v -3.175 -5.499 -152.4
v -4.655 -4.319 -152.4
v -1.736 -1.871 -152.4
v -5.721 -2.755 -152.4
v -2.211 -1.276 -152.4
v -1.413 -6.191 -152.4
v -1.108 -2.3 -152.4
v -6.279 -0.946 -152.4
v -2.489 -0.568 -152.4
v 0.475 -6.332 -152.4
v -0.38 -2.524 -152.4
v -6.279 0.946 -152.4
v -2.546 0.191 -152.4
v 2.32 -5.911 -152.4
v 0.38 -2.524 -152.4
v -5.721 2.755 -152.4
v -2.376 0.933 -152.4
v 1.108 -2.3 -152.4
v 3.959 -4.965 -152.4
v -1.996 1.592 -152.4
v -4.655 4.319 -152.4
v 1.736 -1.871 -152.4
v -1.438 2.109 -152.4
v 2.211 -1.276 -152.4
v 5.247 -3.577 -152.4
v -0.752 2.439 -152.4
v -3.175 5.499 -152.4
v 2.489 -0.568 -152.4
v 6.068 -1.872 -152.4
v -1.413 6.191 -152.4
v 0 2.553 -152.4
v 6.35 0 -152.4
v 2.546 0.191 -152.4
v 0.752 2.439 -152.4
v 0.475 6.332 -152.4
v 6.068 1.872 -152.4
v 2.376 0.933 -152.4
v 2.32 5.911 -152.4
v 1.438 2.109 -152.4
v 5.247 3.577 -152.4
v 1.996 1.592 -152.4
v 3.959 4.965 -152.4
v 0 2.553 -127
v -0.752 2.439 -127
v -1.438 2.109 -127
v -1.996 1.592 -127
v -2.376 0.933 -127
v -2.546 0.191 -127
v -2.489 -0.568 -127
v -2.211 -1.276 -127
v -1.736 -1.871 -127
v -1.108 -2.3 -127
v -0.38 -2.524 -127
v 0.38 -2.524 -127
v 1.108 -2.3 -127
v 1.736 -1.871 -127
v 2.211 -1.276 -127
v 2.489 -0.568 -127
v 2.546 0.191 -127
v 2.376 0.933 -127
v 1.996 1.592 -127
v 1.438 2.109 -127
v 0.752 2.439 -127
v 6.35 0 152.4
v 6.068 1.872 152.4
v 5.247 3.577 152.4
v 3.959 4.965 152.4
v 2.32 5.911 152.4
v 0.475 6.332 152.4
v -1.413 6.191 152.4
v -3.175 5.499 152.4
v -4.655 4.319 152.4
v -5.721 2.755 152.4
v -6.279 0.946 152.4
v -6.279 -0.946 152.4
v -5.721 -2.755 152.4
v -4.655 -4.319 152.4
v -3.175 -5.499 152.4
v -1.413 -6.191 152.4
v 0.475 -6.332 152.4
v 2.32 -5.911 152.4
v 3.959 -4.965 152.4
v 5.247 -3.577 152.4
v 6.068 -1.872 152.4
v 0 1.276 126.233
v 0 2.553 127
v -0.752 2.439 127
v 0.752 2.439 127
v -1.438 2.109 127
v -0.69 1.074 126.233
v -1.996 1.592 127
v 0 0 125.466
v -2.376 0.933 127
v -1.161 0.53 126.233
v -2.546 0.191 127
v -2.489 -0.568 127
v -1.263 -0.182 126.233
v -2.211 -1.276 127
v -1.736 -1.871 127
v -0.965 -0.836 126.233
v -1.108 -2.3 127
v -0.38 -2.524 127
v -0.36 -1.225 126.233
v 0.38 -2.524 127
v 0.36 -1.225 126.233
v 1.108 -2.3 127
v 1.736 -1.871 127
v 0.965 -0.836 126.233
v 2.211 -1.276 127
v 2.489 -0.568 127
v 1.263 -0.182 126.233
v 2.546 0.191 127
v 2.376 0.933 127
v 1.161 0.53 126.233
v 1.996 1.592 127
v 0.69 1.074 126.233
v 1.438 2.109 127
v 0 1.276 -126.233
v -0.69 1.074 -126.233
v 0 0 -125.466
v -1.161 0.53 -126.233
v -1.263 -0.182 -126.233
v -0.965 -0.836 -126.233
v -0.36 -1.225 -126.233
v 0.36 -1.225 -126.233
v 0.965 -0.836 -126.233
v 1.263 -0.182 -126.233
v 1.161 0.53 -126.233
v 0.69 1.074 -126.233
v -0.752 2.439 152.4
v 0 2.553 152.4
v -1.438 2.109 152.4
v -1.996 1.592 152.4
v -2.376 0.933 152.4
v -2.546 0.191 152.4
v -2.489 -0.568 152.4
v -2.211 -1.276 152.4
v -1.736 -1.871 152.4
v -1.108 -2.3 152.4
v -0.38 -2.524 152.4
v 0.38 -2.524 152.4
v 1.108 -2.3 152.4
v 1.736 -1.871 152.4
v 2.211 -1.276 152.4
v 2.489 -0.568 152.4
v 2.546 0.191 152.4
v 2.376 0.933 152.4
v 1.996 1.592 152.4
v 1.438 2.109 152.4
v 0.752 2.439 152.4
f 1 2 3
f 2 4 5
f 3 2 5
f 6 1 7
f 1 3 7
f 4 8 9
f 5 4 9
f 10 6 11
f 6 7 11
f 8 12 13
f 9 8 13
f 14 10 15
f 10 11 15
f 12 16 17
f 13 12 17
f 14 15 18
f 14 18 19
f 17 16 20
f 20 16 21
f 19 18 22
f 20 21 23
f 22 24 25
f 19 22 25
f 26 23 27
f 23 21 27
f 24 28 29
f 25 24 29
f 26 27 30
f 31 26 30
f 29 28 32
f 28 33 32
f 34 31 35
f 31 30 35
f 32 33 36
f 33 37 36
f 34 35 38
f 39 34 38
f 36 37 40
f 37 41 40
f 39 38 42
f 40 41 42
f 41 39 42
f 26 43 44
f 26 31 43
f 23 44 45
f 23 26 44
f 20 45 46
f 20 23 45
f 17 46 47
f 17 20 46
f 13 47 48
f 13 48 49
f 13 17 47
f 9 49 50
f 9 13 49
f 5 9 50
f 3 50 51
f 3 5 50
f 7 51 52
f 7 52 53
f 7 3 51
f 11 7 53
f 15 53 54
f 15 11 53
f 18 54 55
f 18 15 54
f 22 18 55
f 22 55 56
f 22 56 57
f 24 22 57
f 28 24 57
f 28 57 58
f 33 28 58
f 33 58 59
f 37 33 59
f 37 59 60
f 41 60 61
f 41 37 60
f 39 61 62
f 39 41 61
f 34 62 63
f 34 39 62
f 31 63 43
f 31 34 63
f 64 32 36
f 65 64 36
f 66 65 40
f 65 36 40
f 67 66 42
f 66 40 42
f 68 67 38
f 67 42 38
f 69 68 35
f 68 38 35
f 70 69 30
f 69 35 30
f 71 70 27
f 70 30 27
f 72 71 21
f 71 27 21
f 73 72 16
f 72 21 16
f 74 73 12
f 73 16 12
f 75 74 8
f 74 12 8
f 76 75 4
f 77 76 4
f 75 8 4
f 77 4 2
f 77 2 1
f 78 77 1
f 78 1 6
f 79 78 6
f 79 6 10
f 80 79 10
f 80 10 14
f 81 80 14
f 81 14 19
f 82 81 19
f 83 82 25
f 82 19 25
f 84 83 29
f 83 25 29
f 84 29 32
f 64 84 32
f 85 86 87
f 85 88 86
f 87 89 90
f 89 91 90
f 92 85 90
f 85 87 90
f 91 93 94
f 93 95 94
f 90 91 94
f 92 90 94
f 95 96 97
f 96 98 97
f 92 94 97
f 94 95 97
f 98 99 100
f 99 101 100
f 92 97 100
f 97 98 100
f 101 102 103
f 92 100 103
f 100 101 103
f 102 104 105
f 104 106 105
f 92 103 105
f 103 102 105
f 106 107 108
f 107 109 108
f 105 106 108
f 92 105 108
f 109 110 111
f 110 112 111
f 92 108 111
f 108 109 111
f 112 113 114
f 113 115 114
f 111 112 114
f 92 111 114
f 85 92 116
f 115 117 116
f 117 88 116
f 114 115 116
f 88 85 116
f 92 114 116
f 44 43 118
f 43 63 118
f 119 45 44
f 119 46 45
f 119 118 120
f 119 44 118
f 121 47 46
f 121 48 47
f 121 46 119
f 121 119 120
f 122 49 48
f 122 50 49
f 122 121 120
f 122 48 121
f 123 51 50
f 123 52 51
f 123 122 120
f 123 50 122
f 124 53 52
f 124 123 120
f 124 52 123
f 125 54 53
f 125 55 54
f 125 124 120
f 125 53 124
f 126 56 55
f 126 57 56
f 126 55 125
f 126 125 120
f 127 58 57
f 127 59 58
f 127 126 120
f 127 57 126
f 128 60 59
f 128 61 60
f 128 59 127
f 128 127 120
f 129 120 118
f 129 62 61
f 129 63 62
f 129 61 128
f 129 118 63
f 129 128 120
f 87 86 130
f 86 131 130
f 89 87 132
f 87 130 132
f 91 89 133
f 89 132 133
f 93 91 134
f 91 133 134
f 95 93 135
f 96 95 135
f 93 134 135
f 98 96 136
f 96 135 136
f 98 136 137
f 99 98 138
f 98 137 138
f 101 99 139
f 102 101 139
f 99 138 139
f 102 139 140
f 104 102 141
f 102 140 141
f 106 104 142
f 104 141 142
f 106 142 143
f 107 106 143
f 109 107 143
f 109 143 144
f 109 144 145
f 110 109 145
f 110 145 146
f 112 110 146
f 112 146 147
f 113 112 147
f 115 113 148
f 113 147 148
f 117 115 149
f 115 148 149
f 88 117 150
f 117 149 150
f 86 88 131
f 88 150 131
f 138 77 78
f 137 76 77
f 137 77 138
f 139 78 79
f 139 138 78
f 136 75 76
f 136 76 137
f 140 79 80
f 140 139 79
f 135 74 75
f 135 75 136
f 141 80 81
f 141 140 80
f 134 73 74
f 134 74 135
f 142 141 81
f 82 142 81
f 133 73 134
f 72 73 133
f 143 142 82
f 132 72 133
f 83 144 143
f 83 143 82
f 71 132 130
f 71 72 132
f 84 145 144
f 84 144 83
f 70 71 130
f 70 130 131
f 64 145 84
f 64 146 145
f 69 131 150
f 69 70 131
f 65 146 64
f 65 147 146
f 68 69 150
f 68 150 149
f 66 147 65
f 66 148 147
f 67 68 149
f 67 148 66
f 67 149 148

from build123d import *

# Parameters (mm, degrees)
BOSS_EXTRUDE1_DEPTH      = 152.4
BOSS_EXTRUDE1_DEPTH_BACK = 152.4
SKETCH3_R                = 6.35


with BuildPart() as part:
    # Sketch3 → Boss-Extrude1 (new, two sides: drawn at the far end of the back side and taken through both)
    with BuildSketch(Plane.XY.offset(-BOSS_EXTRUDE1_DEPTH_BACK)):
        Circle(SKETCH3_R)
    extrude(amount=BOSS_EXTRUDE1_DEPTH + BOSS_EXTRUDE1_DEPTH_BACK)

    # Sketch7 → 1/4-20 Tapped Hole1 (revolve, cut)
    with BuildSketch(Plane(origin=(0, 0, -152.4), x_dir=(0, 1, 0), z_dir=(1, 0, 0))):
        Polygon((0, 0), (0, 26.933816902), (2.5527, 25.4), (2.5527, 0), align=None)
    f_1_4_20_tapped_hole1 = revolve(axis=Axis((0, 0, -158.75), (0, 0, 1)), mode=Mode.SUBTRACT)

    # Mirror1: 1/4-20 Tapped Hole1 across plane
    add(f_1_4_20_tapped_hole1.mirror(Plane.XY), mode=Mode.SUBTRACT)


solid = part.part
